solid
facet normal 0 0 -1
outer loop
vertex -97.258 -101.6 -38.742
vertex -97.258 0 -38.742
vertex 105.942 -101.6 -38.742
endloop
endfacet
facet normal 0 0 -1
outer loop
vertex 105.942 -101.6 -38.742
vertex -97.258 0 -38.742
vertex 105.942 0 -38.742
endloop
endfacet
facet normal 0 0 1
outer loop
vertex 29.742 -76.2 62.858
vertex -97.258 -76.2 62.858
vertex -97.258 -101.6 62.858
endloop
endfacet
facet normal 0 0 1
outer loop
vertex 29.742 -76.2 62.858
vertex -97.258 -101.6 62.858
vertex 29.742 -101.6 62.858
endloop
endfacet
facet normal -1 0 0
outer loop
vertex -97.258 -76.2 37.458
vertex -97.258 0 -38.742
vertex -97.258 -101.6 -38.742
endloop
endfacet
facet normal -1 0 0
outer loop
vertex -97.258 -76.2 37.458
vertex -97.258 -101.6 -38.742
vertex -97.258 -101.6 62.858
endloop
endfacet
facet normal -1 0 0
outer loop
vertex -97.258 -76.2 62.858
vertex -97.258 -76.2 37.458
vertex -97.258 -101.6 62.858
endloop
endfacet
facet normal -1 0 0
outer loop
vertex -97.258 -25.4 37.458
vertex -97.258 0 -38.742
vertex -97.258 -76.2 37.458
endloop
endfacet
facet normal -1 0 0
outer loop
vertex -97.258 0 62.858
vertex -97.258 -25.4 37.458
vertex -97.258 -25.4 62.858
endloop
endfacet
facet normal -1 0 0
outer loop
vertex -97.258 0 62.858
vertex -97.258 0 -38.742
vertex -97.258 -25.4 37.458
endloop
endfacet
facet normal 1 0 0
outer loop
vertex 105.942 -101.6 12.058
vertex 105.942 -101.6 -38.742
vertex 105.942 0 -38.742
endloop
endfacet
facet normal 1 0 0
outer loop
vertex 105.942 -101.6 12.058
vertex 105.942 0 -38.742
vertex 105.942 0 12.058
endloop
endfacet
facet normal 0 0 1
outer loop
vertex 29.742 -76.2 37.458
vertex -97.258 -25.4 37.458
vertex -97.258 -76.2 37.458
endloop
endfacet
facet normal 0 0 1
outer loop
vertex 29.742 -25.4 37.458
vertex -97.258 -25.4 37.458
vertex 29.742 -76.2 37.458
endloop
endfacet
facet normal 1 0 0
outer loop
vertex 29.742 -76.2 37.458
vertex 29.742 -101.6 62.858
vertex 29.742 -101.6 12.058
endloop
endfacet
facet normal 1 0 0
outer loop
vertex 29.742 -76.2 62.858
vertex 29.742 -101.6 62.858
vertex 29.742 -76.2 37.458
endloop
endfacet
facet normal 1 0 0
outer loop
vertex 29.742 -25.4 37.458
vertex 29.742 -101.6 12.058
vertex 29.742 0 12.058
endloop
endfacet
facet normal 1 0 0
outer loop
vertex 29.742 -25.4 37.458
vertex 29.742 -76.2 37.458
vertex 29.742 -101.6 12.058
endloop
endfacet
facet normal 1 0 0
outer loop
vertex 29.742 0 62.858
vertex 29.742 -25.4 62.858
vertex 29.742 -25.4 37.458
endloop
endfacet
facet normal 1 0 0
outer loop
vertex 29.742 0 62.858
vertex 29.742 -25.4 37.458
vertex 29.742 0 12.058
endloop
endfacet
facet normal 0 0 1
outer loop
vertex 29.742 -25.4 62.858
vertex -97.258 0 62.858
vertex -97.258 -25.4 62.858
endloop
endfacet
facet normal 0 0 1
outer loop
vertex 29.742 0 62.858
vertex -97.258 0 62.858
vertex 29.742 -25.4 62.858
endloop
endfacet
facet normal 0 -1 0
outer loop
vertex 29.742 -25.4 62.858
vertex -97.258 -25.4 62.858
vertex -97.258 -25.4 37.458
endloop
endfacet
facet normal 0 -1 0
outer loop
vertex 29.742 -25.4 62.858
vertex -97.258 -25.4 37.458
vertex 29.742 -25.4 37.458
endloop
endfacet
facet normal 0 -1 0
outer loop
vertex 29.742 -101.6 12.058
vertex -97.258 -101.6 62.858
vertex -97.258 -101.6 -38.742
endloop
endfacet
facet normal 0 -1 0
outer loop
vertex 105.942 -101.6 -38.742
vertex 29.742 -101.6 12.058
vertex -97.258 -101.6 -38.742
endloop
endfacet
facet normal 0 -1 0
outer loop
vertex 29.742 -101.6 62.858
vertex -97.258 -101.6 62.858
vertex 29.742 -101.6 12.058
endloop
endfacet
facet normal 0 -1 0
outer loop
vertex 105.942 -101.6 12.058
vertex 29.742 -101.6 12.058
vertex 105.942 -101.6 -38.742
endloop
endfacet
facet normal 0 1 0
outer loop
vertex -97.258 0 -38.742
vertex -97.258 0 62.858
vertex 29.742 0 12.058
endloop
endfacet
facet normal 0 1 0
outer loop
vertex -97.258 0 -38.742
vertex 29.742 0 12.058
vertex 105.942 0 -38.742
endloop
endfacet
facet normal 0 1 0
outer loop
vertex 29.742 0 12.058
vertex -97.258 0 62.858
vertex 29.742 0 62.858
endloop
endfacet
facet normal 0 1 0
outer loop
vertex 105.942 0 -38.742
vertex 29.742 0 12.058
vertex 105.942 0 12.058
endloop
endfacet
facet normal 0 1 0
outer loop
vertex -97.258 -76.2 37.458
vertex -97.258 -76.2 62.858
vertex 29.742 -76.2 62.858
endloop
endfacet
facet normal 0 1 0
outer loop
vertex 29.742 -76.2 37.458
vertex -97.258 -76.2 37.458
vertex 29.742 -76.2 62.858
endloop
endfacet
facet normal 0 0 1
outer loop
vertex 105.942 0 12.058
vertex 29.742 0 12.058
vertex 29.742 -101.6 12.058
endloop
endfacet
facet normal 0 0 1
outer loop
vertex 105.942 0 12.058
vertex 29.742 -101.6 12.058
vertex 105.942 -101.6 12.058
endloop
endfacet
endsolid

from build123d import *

# Parameters (mm, degrees)
F0_W     = 203.2
F0_H     = 101.6
F1_DEPTH = 101.6
F2_W     = 76.2
F2_H     = 101.6
F3_DEPTH = 50.8
F4_W     = 127
F4_H     = 50.8
F5_DEPTH = 25.4


with BuildPart() as f1:
    # F0 (on Front) → F1 (new body)
    with BuildSketch(Plane.XZ):
        with Locations((4.342319, 12.05778)):
            Rectangle(F0_W, F0_H)
    extrude(amount=F1_DEPTH)

    # F2 (on face) → F3 (cut)
    with BuildSketch(Plane.XY.offset(62.85778)):
        with Locations((67.842319, -50.8)):
            Rectangle(F2_W, F2_H)
    extrude(amount=-F3_DEPTH, mode=Mode.SUBTRACT)

    # F4 (on face) → F5 (cut)
    with BuildSketch(Plane.XY.offset(62.85778)):
        with Locations((-33.757681, -50.8)):
            Rectangle(F4_W, F4_H)
    extrude(amount=-F5_DEPTH, mode=Mode.SUBTRACT)


solid = f1.part
